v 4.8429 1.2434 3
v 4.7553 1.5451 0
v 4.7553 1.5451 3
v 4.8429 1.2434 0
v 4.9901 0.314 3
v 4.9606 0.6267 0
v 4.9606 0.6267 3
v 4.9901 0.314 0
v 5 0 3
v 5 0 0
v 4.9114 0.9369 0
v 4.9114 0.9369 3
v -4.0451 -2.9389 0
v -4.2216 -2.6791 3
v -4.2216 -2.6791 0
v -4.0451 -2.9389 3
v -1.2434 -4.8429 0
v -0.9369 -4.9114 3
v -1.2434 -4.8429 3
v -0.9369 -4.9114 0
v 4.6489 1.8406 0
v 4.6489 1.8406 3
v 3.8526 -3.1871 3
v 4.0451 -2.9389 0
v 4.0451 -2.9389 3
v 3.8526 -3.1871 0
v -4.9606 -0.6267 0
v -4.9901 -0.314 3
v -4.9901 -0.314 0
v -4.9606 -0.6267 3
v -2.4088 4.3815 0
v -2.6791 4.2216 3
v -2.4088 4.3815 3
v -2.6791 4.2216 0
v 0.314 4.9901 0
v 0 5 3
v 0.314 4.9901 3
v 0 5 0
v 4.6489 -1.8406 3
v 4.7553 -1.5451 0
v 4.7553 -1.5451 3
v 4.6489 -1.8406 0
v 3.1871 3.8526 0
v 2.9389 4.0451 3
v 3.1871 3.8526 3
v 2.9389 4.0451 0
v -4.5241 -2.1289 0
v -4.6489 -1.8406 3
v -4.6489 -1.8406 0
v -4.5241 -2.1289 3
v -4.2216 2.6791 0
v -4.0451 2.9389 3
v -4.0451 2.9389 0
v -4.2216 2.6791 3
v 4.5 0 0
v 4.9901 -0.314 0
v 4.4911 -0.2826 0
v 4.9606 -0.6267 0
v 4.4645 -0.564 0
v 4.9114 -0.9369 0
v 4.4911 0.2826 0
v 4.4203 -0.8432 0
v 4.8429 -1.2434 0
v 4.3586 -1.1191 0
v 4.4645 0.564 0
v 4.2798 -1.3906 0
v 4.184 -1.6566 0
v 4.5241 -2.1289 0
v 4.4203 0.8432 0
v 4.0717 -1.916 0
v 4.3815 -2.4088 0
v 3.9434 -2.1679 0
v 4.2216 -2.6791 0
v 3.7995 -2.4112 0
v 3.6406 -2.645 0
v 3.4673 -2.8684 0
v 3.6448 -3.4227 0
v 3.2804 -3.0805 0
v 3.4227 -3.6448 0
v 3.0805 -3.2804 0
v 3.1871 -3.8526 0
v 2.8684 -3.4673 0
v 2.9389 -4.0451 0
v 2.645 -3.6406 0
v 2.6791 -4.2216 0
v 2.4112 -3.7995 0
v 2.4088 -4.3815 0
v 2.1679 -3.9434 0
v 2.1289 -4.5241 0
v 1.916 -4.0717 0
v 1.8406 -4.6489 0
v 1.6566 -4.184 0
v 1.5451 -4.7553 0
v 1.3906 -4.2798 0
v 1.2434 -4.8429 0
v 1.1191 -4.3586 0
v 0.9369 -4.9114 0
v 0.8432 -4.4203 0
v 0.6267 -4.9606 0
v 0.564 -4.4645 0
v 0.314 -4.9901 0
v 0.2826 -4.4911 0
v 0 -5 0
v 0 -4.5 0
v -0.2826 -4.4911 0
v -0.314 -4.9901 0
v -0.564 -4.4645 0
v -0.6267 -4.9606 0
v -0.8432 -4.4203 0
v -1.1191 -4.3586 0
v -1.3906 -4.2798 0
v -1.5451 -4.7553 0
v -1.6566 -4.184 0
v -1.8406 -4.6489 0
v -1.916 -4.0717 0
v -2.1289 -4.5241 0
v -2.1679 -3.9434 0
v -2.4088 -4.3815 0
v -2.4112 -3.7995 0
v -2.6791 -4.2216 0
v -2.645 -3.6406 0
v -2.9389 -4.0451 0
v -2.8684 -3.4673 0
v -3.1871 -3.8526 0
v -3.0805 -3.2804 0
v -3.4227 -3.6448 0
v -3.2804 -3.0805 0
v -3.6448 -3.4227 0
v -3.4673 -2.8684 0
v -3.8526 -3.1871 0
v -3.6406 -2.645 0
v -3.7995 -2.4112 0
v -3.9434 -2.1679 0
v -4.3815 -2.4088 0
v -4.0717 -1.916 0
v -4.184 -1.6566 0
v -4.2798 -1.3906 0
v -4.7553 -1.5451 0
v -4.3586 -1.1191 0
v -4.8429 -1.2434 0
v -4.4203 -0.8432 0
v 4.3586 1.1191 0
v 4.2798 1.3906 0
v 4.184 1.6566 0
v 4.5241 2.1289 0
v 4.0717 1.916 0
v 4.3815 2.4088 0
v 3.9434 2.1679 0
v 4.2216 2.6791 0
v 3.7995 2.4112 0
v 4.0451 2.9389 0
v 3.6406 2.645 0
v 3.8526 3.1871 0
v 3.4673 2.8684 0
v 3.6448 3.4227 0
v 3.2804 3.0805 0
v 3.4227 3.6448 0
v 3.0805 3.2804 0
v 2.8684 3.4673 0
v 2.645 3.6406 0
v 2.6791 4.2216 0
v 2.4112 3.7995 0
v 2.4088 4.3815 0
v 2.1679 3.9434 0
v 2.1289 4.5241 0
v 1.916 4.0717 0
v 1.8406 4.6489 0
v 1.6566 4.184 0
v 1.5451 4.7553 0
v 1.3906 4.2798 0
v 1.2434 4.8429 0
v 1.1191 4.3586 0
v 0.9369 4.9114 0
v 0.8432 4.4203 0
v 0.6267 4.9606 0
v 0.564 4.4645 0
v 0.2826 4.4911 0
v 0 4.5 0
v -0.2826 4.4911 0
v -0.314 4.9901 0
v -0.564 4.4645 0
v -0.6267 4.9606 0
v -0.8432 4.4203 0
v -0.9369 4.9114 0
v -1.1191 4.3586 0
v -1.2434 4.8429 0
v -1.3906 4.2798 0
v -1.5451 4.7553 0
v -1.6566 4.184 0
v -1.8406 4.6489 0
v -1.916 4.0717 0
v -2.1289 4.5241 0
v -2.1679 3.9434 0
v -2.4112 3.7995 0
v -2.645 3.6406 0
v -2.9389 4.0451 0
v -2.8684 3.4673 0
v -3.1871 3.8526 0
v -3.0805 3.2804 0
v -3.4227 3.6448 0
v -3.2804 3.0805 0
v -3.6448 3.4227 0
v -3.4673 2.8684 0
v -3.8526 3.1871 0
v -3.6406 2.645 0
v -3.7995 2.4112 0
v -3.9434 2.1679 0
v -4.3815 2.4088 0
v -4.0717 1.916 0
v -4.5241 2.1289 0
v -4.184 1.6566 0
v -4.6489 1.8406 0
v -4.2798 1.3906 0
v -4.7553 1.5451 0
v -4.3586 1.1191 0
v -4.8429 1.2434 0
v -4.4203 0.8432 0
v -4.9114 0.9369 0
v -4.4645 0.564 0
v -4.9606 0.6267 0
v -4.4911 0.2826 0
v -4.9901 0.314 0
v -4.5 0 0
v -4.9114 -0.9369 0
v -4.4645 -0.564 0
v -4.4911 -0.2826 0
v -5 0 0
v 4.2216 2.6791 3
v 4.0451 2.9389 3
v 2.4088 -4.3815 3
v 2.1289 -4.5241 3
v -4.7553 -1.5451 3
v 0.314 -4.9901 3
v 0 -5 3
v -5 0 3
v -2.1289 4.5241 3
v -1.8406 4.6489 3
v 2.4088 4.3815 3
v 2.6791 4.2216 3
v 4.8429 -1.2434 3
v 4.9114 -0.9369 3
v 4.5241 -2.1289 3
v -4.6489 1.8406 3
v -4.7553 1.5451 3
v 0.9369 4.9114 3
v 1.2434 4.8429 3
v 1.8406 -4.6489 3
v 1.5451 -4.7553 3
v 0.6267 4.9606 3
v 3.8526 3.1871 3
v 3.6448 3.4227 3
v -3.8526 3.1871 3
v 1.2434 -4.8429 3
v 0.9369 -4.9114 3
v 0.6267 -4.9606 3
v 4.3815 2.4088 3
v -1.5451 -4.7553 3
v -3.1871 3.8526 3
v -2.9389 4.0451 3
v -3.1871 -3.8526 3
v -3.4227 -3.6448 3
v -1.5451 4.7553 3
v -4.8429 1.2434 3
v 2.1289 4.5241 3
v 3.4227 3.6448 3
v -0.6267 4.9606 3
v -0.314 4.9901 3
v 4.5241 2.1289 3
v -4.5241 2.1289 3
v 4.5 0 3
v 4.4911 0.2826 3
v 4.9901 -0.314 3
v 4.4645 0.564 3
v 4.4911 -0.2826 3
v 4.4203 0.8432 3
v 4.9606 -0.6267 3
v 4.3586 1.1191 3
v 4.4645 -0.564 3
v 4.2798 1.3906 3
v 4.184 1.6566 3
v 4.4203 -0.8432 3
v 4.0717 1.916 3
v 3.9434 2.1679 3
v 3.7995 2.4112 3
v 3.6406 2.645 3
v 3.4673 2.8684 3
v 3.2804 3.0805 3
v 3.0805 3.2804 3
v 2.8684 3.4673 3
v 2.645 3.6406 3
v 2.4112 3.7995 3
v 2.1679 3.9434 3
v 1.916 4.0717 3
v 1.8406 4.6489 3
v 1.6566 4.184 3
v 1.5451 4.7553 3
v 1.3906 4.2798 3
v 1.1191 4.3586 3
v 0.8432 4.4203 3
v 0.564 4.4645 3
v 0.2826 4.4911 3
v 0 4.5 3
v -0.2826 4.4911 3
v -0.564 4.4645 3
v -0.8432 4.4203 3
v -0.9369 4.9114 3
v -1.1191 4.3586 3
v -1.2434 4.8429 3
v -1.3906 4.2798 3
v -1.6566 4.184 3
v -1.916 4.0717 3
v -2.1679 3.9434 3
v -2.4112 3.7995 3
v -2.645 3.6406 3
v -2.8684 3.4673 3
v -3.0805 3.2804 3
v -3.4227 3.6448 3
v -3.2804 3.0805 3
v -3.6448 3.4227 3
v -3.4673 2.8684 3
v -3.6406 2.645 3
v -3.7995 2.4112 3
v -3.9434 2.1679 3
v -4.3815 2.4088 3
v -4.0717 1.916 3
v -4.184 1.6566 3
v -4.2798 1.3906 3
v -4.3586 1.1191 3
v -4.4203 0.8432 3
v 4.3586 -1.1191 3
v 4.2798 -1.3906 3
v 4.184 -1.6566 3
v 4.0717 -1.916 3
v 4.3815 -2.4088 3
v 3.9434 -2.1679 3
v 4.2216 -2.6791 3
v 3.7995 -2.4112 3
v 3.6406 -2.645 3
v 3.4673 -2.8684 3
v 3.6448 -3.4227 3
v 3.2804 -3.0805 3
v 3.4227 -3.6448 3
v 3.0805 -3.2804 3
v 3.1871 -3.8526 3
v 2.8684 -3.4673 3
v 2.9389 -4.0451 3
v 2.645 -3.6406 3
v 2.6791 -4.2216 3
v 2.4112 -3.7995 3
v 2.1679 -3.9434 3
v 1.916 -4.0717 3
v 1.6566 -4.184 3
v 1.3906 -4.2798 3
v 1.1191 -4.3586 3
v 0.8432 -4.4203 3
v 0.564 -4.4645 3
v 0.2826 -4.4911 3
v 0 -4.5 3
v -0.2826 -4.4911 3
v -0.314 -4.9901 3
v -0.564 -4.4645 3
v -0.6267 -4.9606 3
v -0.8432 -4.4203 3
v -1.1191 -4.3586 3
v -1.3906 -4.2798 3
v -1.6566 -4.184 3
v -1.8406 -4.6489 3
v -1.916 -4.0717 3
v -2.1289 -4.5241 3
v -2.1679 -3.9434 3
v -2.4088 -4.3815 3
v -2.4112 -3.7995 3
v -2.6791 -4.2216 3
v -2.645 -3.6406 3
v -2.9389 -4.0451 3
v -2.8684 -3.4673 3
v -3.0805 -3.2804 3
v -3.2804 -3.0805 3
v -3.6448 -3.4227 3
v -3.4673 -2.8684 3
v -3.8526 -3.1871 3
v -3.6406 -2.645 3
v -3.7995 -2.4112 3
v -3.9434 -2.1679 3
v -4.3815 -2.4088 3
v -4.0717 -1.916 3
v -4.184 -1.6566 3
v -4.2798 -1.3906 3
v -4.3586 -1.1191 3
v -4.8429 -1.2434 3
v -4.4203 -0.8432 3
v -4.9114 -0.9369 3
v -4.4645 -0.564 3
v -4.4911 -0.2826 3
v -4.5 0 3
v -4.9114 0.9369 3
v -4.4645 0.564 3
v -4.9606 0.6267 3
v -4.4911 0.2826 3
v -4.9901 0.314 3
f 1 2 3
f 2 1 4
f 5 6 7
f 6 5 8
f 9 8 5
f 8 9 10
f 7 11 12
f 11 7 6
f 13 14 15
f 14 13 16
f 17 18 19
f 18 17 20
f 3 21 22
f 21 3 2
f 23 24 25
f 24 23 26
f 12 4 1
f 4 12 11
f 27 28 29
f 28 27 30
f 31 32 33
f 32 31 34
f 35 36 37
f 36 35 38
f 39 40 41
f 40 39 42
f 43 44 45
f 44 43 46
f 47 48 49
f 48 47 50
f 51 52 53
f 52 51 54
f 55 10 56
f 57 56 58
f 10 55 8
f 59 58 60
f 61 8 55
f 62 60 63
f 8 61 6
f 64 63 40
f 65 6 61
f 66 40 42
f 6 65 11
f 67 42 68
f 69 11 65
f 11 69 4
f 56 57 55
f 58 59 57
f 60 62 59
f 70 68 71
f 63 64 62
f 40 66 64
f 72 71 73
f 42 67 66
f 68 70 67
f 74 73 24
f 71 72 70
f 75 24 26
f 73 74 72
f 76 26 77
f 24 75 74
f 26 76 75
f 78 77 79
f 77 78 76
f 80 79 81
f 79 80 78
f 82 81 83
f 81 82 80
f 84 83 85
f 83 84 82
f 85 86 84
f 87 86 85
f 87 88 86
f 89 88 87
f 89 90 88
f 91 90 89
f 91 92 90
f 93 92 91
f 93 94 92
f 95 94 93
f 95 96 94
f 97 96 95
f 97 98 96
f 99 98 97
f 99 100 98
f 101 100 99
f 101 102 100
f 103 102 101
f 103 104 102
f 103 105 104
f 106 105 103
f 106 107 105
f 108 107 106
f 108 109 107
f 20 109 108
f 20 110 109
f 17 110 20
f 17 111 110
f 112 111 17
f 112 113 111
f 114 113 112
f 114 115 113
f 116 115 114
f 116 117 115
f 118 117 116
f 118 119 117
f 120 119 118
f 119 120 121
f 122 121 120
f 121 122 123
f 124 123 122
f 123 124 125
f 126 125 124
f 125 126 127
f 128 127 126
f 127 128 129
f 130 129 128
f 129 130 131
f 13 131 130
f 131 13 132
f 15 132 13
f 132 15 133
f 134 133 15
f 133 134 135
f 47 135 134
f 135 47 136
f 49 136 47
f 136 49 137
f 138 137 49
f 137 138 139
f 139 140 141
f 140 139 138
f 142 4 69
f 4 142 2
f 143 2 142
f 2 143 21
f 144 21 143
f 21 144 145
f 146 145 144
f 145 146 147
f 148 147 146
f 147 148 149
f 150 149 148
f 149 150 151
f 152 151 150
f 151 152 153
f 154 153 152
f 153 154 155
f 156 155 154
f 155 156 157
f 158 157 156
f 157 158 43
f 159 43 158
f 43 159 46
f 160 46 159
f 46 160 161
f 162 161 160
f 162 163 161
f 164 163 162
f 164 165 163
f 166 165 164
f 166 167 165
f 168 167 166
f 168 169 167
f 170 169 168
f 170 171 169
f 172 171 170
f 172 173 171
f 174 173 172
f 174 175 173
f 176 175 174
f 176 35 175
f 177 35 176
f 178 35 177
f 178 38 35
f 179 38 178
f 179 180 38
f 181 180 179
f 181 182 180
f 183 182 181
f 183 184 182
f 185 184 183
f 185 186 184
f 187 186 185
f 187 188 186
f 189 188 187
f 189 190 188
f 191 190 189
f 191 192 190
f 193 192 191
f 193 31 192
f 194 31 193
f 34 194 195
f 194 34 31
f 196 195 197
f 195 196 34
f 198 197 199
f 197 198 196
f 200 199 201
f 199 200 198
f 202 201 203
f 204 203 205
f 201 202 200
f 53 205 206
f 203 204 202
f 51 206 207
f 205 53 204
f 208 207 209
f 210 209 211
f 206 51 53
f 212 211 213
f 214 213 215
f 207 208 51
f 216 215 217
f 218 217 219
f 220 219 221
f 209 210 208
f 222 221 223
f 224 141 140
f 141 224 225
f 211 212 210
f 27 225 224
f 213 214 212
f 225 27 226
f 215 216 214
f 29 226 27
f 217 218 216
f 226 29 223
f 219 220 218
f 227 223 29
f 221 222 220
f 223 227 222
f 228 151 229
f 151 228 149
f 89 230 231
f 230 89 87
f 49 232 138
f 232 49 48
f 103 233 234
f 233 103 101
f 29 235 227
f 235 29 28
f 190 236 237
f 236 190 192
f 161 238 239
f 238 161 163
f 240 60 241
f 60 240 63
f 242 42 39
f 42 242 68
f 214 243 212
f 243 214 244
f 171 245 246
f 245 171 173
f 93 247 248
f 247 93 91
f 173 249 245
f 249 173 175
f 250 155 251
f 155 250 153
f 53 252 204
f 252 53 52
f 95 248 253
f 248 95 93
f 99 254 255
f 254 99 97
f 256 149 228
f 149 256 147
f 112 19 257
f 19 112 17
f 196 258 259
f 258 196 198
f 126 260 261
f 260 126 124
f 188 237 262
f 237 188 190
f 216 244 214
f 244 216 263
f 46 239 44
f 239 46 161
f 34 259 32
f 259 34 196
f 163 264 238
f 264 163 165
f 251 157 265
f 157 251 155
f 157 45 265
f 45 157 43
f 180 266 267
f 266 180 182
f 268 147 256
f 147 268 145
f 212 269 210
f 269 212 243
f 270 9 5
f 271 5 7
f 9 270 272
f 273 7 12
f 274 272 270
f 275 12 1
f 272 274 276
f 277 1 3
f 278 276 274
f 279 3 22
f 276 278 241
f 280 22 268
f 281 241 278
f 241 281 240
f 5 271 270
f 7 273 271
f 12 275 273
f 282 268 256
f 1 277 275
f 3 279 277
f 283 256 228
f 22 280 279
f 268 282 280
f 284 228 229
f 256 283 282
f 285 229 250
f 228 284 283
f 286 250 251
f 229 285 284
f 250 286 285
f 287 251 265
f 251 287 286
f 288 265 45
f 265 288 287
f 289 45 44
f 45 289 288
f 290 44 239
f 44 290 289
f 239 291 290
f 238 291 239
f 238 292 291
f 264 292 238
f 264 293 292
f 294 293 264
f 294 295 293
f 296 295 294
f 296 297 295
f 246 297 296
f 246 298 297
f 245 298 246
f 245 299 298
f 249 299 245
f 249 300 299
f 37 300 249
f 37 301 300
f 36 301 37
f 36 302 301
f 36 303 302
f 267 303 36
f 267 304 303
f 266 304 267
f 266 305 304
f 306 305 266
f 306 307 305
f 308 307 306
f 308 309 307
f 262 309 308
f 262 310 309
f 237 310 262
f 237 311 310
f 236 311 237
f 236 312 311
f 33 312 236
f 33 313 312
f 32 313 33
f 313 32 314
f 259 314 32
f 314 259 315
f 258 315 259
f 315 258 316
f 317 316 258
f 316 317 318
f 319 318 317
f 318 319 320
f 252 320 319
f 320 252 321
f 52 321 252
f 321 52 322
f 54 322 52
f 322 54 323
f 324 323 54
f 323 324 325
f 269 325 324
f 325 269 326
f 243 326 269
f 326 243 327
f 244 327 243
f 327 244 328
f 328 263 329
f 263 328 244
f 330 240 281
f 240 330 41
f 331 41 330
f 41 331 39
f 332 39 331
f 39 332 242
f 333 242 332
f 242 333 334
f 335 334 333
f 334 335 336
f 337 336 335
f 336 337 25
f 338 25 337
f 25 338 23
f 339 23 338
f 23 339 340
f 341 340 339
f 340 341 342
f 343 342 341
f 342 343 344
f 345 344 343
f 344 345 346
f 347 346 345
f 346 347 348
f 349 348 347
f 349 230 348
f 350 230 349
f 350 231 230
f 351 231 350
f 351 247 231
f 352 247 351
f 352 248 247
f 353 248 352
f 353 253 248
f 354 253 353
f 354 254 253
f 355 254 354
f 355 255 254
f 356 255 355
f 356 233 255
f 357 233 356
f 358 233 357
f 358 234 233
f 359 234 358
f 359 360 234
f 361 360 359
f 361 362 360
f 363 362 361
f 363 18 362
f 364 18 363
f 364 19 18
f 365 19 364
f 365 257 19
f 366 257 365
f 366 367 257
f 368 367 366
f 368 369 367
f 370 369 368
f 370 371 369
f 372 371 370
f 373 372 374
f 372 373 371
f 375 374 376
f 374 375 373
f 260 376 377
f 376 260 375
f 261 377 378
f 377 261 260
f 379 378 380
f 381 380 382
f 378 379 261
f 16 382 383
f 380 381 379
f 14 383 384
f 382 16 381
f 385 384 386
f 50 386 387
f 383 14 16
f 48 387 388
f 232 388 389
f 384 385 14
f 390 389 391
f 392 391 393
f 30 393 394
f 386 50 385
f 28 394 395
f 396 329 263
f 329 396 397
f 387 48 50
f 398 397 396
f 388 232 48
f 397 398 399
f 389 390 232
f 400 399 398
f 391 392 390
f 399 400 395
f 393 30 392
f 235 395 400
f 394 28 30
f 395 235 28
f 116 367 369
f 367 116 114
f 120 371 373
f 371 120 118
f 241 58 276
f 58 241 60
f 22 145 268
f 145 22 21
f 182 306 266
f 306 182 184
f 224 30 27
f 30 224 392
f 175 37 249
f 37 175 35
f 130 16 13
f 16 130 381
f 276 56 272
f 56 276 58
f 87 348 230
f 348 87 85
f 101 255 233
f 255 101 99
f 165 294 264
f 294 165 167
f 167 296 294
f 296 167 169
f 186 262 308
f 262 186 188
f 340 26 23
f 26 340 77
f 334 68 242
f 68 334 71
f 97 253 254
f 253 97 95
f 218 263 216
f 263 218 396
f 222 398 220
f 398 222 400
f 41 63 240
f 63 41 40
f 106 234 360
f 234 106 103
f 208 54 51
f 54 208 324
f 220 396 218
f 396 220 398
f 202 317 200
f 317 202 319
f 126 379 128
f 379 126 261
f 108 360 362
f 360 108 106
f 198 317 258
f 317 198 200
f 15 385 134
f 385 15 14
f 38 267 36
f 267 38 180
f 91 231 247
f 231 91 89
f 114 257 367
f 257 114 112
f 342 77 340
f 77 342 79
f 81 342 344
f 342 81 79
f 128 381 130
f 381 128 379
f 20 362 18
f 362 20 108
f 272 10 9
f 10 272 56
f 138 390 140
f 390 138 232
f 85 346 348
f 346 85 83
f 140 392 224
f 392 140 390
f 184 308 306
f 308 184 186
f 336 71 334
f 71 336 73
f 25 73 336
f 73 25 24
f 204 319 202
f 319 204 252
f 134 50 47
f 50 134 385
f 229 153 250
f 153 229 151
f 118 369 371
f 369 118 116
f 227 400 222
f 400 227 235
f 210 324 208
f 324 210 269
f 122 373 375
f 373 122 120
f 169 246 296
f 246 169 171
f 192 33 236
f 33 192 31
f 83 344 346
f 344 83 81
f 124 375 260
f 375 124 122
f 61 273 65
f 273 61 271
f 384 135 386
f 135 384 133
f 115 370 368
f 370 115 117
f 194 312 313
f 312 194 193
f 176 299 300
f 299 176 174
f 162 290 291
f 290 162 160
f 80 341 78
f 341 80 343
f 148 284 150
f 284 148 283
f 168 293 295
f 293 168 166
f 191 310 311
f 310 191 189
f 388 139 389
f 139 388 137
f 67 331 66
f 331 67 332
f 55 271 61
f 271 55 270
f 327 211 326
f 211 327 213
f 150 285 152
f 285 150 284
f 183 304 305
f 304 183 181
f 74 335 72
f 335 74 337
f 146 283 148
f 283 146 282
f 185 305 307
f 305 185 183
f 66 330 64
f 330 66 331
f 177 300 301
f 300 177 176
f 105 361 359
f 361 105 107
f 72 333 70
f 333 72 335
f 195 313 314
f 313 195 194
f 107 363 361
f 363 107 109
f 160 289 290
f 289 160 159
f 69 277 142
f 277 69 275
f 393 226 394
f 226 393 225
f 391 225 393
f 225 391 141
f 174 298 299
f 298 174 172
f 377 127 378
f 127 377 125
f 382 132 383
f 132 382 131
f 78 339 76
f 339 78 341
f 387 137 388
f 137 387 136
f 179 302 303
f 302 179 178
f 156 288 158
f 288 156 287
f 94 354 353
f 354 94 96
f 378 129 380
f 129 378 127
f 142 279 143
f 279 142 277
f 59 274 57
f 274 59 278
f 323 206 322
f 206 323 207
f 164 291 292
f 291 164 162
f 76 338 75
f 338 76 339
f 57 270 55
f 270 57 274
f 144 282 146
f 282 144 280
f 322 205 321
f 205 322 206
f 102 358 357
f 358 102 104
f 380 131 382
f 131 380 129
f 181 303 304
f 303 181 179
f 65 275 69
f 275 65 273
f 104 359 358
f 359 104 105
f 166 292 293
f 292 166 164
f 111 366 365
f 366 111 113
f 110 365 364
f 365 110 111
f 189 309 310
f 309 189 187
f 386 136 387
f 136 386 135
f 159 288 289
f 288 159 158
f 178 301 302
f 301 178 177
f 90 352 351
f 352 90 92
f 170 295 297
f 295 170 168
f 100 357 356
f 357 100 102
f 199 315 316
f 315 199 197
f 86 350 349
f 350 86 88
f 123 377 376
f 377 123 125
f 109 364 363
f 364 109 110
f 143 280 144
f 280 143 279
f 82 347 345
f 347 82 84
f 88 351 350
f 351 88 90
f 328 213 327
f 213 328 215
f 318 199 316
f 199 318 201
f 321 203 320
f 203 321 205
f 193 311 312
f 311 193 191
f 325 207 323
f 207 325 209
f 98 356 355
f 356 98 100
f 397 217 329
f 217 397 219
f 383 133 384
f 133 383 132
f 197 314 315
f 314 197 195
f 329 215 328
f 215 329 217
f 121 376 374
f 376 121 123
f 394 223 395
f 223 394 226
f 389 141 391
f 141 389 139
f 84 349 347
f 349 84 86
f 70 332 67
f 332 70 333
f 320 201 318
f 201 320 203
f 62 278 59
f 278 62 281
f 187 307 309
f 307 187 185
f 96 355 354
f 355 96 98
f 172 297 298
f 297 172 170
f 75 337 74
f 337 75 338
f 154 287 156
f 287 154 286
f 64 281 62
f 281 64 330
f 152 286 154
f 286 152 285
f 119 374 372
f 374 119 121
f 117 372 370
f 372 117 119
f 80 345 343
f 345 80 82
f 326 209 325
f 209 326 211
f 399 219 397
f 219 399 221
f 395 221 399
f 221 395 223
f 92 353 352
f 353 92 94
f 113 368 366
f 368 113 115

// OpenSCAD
$fn=100;


difference(){
    cylinder(h=3,r=5);
    cylinder(h=3.1,r=4.5);
}
